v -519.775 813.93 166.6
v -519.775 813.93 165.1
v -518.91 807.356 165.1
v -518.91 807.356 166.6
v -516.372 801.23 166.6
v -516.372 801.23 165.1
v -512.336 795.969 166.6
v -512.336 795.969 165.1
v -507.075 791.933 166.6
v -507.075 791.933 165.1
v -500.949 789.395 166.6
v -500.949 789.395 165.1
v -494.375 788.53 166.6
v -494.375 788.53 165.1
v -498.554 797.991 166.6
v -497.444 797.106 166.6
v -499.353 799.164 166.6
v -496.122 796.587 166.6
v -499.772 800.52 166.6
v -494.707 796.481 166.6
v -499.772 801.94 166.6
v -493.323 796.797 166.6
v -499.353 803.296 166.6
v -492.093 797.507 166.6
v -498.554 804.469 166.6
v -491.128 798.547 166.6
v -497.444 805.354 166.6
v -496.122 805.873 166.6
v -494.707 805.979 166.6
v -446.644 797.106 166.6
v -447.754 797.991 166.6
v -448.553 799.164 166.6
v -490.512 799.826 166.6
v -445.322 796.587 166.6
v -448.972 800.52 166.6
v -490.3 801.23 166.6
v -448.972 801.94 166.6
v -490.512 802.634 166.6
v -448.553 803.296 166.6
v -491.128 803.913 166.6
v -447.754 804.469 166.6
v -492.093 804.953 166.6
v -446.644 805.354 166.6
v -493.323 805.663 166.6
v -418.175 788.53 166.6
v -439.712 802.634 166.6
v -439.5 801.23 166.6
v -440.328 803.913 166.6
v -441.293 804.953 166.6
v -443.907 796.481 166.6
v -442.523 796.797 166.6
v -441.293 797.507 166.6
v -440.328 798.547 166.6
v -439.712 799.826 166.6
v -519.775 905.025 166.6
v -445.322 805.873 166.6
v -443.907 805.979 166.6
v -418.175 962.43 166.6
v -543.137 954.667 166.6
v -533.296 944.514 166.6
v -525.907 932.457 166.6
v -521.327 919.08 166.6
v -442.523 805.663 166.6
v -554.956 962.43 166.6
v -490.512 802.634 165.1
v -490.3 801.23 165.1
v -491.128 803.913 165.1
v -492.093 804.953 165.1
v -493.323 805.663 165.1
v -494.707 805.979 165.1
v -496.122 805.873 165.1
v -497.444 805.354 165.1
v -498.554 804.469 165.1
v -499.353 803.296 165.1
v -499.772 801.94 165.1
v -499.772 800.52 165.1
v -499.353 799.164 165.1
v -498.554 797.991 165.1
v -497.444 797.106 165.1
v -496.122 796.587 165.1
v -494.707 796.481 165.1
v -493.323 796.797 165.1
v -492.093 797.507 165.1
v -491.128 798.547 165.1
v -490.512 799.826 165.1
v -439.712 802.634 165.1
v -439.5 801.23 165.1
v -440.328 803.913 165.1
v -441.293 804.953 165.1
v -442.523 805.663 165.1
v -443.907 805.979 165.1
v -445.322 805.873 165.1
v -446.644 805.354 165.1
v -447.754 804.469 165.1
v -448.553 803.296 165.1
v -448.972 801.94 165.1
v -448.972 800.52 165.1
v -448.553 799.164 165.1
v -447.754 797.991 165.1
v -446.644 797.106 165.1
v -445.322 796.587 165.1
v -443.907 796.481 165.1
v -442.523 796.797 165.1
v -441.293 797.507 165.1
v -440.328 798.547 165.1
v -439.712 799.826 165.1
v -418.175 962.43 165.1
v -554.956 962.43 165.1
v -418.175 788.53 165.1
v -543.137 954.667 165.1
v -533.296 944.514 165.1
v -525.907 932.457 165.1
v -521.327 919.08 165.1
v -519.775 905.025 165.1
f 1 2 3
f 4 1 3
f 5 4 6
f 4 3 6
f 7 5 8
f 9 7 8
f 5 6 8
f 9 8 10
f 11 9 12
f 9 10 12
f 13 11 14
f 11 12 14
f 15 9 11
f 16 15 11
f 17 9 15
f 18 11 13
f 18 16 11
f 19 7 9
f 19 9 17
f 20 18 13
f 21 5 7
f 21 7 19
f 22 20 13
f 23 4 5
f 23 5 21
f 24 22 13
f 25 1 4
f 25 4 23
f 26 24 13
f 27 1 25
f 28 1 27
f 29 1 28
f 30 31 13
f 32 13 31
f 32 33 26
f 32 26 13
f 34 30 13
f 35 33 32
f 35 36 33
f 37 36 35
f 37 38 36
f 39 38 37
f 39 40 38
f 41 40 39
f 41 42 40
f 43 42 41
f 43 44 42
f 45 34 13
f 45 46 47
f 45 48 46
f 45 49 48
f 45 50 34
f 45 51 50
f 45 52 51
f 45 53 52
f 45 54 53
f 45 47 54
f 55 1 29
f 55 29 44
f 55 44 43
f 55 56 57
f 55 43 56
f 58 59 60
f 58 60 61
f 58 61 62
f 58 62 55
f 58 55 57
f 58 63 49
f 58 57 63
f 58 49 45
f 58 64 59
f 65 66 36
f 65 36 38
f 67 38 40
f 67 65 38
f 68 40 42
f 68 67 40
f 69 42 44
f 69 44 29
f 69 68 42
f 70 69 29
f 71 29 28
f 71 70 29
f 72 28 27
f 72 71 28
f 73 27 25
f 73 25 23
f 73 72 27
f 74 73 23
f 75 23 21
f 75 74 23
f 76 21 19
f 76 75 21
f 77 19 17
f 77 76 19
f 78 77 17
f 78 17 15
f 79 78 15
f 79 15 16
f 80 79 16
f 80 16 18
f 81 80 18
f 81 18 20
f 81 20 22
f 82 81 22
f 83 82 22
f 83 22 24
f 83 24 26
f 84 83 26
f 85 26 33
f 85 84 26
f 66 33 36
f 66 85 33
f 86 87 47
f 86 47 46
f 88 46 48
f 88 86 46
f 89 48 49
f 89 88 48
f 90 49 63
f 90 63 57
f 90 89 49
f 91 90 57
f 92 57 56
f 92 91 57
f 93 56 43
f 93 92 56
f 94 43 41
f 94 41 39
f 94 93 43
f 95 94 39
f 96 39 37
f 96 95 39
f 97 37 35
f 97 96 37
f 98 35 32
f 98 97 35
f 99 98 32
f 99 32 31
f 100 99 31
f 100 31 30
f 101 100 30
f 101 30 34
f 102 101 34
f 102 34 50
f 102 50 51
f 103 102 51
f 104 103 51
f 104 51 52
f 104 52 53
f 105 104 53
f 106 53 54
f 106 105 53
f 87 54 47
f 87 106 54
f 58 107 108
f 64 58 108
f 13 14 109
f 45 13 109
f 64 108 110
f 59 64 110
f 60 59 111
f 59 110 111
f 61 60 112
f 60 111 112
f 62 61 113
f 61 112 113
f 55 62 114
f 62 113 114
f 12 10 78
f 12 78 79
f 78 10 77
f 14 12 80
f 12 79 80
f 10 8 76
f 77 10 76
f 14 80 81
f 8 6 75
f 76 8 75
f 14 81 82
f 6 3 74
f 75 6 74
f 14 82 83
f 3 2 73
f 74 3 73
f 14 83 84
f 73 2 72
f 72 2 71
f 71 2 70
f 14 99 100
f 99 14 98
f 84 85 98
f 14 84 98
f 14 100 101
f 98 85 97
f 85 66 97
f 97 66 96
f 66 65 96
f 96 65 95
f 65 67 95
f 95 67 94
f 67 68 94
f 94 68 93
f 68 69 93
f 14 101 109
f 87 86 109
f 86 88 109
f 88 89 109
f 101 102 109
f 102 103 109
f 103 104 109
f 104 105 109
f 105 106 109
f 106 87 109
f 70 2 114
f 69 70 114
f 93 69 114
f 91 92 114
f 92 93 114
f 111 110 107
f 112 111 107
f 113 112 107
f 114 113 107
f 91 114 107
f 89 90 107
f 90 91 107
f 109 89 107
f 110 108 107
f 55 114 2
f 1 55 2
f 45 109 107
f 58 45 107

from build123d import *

# Parameters (mm, degrees)
SKETCH1_R      = 4.7625
EXTRUDE1_DEPTH = 1.5


with BuildPart() as part:
    # Sketch1 → Extrude1 (new body)
    with BuildSketch(Plane.XY.offset(165.1)):
        with BuildLine():
            Line((-418.175, 962.43), (-554.955743448, 962.43))
            ThreePointArc((-554.955743448, 962.43), (-529.269854117, 938.688748088), (-519.775, 905.024825288))
            Line((-519.775, 905.024825288), (-519.775, 813.93))
            ThreePointArc((-519.775, 813.93), (-512.335512242, 795.969487758), (-494.375, 788.53))
            Line((-494.375, 788.53), (-418.175, 788.53))
            Line((-418.175, 788.53), (-418.175, 962.43))
        make_face()
        with Locations((-444.2625, 801.23)):
            Circle(SKETCH1_R, mode=Mode.SUBTRACT)
        with Locations((-495.0625, 801.23)):
            Circle(SKETCH1_R, mode=Mode.SUBTRACT)
    extrude(amount=EXTRUDE1_DEPTH)


solid = part.part
